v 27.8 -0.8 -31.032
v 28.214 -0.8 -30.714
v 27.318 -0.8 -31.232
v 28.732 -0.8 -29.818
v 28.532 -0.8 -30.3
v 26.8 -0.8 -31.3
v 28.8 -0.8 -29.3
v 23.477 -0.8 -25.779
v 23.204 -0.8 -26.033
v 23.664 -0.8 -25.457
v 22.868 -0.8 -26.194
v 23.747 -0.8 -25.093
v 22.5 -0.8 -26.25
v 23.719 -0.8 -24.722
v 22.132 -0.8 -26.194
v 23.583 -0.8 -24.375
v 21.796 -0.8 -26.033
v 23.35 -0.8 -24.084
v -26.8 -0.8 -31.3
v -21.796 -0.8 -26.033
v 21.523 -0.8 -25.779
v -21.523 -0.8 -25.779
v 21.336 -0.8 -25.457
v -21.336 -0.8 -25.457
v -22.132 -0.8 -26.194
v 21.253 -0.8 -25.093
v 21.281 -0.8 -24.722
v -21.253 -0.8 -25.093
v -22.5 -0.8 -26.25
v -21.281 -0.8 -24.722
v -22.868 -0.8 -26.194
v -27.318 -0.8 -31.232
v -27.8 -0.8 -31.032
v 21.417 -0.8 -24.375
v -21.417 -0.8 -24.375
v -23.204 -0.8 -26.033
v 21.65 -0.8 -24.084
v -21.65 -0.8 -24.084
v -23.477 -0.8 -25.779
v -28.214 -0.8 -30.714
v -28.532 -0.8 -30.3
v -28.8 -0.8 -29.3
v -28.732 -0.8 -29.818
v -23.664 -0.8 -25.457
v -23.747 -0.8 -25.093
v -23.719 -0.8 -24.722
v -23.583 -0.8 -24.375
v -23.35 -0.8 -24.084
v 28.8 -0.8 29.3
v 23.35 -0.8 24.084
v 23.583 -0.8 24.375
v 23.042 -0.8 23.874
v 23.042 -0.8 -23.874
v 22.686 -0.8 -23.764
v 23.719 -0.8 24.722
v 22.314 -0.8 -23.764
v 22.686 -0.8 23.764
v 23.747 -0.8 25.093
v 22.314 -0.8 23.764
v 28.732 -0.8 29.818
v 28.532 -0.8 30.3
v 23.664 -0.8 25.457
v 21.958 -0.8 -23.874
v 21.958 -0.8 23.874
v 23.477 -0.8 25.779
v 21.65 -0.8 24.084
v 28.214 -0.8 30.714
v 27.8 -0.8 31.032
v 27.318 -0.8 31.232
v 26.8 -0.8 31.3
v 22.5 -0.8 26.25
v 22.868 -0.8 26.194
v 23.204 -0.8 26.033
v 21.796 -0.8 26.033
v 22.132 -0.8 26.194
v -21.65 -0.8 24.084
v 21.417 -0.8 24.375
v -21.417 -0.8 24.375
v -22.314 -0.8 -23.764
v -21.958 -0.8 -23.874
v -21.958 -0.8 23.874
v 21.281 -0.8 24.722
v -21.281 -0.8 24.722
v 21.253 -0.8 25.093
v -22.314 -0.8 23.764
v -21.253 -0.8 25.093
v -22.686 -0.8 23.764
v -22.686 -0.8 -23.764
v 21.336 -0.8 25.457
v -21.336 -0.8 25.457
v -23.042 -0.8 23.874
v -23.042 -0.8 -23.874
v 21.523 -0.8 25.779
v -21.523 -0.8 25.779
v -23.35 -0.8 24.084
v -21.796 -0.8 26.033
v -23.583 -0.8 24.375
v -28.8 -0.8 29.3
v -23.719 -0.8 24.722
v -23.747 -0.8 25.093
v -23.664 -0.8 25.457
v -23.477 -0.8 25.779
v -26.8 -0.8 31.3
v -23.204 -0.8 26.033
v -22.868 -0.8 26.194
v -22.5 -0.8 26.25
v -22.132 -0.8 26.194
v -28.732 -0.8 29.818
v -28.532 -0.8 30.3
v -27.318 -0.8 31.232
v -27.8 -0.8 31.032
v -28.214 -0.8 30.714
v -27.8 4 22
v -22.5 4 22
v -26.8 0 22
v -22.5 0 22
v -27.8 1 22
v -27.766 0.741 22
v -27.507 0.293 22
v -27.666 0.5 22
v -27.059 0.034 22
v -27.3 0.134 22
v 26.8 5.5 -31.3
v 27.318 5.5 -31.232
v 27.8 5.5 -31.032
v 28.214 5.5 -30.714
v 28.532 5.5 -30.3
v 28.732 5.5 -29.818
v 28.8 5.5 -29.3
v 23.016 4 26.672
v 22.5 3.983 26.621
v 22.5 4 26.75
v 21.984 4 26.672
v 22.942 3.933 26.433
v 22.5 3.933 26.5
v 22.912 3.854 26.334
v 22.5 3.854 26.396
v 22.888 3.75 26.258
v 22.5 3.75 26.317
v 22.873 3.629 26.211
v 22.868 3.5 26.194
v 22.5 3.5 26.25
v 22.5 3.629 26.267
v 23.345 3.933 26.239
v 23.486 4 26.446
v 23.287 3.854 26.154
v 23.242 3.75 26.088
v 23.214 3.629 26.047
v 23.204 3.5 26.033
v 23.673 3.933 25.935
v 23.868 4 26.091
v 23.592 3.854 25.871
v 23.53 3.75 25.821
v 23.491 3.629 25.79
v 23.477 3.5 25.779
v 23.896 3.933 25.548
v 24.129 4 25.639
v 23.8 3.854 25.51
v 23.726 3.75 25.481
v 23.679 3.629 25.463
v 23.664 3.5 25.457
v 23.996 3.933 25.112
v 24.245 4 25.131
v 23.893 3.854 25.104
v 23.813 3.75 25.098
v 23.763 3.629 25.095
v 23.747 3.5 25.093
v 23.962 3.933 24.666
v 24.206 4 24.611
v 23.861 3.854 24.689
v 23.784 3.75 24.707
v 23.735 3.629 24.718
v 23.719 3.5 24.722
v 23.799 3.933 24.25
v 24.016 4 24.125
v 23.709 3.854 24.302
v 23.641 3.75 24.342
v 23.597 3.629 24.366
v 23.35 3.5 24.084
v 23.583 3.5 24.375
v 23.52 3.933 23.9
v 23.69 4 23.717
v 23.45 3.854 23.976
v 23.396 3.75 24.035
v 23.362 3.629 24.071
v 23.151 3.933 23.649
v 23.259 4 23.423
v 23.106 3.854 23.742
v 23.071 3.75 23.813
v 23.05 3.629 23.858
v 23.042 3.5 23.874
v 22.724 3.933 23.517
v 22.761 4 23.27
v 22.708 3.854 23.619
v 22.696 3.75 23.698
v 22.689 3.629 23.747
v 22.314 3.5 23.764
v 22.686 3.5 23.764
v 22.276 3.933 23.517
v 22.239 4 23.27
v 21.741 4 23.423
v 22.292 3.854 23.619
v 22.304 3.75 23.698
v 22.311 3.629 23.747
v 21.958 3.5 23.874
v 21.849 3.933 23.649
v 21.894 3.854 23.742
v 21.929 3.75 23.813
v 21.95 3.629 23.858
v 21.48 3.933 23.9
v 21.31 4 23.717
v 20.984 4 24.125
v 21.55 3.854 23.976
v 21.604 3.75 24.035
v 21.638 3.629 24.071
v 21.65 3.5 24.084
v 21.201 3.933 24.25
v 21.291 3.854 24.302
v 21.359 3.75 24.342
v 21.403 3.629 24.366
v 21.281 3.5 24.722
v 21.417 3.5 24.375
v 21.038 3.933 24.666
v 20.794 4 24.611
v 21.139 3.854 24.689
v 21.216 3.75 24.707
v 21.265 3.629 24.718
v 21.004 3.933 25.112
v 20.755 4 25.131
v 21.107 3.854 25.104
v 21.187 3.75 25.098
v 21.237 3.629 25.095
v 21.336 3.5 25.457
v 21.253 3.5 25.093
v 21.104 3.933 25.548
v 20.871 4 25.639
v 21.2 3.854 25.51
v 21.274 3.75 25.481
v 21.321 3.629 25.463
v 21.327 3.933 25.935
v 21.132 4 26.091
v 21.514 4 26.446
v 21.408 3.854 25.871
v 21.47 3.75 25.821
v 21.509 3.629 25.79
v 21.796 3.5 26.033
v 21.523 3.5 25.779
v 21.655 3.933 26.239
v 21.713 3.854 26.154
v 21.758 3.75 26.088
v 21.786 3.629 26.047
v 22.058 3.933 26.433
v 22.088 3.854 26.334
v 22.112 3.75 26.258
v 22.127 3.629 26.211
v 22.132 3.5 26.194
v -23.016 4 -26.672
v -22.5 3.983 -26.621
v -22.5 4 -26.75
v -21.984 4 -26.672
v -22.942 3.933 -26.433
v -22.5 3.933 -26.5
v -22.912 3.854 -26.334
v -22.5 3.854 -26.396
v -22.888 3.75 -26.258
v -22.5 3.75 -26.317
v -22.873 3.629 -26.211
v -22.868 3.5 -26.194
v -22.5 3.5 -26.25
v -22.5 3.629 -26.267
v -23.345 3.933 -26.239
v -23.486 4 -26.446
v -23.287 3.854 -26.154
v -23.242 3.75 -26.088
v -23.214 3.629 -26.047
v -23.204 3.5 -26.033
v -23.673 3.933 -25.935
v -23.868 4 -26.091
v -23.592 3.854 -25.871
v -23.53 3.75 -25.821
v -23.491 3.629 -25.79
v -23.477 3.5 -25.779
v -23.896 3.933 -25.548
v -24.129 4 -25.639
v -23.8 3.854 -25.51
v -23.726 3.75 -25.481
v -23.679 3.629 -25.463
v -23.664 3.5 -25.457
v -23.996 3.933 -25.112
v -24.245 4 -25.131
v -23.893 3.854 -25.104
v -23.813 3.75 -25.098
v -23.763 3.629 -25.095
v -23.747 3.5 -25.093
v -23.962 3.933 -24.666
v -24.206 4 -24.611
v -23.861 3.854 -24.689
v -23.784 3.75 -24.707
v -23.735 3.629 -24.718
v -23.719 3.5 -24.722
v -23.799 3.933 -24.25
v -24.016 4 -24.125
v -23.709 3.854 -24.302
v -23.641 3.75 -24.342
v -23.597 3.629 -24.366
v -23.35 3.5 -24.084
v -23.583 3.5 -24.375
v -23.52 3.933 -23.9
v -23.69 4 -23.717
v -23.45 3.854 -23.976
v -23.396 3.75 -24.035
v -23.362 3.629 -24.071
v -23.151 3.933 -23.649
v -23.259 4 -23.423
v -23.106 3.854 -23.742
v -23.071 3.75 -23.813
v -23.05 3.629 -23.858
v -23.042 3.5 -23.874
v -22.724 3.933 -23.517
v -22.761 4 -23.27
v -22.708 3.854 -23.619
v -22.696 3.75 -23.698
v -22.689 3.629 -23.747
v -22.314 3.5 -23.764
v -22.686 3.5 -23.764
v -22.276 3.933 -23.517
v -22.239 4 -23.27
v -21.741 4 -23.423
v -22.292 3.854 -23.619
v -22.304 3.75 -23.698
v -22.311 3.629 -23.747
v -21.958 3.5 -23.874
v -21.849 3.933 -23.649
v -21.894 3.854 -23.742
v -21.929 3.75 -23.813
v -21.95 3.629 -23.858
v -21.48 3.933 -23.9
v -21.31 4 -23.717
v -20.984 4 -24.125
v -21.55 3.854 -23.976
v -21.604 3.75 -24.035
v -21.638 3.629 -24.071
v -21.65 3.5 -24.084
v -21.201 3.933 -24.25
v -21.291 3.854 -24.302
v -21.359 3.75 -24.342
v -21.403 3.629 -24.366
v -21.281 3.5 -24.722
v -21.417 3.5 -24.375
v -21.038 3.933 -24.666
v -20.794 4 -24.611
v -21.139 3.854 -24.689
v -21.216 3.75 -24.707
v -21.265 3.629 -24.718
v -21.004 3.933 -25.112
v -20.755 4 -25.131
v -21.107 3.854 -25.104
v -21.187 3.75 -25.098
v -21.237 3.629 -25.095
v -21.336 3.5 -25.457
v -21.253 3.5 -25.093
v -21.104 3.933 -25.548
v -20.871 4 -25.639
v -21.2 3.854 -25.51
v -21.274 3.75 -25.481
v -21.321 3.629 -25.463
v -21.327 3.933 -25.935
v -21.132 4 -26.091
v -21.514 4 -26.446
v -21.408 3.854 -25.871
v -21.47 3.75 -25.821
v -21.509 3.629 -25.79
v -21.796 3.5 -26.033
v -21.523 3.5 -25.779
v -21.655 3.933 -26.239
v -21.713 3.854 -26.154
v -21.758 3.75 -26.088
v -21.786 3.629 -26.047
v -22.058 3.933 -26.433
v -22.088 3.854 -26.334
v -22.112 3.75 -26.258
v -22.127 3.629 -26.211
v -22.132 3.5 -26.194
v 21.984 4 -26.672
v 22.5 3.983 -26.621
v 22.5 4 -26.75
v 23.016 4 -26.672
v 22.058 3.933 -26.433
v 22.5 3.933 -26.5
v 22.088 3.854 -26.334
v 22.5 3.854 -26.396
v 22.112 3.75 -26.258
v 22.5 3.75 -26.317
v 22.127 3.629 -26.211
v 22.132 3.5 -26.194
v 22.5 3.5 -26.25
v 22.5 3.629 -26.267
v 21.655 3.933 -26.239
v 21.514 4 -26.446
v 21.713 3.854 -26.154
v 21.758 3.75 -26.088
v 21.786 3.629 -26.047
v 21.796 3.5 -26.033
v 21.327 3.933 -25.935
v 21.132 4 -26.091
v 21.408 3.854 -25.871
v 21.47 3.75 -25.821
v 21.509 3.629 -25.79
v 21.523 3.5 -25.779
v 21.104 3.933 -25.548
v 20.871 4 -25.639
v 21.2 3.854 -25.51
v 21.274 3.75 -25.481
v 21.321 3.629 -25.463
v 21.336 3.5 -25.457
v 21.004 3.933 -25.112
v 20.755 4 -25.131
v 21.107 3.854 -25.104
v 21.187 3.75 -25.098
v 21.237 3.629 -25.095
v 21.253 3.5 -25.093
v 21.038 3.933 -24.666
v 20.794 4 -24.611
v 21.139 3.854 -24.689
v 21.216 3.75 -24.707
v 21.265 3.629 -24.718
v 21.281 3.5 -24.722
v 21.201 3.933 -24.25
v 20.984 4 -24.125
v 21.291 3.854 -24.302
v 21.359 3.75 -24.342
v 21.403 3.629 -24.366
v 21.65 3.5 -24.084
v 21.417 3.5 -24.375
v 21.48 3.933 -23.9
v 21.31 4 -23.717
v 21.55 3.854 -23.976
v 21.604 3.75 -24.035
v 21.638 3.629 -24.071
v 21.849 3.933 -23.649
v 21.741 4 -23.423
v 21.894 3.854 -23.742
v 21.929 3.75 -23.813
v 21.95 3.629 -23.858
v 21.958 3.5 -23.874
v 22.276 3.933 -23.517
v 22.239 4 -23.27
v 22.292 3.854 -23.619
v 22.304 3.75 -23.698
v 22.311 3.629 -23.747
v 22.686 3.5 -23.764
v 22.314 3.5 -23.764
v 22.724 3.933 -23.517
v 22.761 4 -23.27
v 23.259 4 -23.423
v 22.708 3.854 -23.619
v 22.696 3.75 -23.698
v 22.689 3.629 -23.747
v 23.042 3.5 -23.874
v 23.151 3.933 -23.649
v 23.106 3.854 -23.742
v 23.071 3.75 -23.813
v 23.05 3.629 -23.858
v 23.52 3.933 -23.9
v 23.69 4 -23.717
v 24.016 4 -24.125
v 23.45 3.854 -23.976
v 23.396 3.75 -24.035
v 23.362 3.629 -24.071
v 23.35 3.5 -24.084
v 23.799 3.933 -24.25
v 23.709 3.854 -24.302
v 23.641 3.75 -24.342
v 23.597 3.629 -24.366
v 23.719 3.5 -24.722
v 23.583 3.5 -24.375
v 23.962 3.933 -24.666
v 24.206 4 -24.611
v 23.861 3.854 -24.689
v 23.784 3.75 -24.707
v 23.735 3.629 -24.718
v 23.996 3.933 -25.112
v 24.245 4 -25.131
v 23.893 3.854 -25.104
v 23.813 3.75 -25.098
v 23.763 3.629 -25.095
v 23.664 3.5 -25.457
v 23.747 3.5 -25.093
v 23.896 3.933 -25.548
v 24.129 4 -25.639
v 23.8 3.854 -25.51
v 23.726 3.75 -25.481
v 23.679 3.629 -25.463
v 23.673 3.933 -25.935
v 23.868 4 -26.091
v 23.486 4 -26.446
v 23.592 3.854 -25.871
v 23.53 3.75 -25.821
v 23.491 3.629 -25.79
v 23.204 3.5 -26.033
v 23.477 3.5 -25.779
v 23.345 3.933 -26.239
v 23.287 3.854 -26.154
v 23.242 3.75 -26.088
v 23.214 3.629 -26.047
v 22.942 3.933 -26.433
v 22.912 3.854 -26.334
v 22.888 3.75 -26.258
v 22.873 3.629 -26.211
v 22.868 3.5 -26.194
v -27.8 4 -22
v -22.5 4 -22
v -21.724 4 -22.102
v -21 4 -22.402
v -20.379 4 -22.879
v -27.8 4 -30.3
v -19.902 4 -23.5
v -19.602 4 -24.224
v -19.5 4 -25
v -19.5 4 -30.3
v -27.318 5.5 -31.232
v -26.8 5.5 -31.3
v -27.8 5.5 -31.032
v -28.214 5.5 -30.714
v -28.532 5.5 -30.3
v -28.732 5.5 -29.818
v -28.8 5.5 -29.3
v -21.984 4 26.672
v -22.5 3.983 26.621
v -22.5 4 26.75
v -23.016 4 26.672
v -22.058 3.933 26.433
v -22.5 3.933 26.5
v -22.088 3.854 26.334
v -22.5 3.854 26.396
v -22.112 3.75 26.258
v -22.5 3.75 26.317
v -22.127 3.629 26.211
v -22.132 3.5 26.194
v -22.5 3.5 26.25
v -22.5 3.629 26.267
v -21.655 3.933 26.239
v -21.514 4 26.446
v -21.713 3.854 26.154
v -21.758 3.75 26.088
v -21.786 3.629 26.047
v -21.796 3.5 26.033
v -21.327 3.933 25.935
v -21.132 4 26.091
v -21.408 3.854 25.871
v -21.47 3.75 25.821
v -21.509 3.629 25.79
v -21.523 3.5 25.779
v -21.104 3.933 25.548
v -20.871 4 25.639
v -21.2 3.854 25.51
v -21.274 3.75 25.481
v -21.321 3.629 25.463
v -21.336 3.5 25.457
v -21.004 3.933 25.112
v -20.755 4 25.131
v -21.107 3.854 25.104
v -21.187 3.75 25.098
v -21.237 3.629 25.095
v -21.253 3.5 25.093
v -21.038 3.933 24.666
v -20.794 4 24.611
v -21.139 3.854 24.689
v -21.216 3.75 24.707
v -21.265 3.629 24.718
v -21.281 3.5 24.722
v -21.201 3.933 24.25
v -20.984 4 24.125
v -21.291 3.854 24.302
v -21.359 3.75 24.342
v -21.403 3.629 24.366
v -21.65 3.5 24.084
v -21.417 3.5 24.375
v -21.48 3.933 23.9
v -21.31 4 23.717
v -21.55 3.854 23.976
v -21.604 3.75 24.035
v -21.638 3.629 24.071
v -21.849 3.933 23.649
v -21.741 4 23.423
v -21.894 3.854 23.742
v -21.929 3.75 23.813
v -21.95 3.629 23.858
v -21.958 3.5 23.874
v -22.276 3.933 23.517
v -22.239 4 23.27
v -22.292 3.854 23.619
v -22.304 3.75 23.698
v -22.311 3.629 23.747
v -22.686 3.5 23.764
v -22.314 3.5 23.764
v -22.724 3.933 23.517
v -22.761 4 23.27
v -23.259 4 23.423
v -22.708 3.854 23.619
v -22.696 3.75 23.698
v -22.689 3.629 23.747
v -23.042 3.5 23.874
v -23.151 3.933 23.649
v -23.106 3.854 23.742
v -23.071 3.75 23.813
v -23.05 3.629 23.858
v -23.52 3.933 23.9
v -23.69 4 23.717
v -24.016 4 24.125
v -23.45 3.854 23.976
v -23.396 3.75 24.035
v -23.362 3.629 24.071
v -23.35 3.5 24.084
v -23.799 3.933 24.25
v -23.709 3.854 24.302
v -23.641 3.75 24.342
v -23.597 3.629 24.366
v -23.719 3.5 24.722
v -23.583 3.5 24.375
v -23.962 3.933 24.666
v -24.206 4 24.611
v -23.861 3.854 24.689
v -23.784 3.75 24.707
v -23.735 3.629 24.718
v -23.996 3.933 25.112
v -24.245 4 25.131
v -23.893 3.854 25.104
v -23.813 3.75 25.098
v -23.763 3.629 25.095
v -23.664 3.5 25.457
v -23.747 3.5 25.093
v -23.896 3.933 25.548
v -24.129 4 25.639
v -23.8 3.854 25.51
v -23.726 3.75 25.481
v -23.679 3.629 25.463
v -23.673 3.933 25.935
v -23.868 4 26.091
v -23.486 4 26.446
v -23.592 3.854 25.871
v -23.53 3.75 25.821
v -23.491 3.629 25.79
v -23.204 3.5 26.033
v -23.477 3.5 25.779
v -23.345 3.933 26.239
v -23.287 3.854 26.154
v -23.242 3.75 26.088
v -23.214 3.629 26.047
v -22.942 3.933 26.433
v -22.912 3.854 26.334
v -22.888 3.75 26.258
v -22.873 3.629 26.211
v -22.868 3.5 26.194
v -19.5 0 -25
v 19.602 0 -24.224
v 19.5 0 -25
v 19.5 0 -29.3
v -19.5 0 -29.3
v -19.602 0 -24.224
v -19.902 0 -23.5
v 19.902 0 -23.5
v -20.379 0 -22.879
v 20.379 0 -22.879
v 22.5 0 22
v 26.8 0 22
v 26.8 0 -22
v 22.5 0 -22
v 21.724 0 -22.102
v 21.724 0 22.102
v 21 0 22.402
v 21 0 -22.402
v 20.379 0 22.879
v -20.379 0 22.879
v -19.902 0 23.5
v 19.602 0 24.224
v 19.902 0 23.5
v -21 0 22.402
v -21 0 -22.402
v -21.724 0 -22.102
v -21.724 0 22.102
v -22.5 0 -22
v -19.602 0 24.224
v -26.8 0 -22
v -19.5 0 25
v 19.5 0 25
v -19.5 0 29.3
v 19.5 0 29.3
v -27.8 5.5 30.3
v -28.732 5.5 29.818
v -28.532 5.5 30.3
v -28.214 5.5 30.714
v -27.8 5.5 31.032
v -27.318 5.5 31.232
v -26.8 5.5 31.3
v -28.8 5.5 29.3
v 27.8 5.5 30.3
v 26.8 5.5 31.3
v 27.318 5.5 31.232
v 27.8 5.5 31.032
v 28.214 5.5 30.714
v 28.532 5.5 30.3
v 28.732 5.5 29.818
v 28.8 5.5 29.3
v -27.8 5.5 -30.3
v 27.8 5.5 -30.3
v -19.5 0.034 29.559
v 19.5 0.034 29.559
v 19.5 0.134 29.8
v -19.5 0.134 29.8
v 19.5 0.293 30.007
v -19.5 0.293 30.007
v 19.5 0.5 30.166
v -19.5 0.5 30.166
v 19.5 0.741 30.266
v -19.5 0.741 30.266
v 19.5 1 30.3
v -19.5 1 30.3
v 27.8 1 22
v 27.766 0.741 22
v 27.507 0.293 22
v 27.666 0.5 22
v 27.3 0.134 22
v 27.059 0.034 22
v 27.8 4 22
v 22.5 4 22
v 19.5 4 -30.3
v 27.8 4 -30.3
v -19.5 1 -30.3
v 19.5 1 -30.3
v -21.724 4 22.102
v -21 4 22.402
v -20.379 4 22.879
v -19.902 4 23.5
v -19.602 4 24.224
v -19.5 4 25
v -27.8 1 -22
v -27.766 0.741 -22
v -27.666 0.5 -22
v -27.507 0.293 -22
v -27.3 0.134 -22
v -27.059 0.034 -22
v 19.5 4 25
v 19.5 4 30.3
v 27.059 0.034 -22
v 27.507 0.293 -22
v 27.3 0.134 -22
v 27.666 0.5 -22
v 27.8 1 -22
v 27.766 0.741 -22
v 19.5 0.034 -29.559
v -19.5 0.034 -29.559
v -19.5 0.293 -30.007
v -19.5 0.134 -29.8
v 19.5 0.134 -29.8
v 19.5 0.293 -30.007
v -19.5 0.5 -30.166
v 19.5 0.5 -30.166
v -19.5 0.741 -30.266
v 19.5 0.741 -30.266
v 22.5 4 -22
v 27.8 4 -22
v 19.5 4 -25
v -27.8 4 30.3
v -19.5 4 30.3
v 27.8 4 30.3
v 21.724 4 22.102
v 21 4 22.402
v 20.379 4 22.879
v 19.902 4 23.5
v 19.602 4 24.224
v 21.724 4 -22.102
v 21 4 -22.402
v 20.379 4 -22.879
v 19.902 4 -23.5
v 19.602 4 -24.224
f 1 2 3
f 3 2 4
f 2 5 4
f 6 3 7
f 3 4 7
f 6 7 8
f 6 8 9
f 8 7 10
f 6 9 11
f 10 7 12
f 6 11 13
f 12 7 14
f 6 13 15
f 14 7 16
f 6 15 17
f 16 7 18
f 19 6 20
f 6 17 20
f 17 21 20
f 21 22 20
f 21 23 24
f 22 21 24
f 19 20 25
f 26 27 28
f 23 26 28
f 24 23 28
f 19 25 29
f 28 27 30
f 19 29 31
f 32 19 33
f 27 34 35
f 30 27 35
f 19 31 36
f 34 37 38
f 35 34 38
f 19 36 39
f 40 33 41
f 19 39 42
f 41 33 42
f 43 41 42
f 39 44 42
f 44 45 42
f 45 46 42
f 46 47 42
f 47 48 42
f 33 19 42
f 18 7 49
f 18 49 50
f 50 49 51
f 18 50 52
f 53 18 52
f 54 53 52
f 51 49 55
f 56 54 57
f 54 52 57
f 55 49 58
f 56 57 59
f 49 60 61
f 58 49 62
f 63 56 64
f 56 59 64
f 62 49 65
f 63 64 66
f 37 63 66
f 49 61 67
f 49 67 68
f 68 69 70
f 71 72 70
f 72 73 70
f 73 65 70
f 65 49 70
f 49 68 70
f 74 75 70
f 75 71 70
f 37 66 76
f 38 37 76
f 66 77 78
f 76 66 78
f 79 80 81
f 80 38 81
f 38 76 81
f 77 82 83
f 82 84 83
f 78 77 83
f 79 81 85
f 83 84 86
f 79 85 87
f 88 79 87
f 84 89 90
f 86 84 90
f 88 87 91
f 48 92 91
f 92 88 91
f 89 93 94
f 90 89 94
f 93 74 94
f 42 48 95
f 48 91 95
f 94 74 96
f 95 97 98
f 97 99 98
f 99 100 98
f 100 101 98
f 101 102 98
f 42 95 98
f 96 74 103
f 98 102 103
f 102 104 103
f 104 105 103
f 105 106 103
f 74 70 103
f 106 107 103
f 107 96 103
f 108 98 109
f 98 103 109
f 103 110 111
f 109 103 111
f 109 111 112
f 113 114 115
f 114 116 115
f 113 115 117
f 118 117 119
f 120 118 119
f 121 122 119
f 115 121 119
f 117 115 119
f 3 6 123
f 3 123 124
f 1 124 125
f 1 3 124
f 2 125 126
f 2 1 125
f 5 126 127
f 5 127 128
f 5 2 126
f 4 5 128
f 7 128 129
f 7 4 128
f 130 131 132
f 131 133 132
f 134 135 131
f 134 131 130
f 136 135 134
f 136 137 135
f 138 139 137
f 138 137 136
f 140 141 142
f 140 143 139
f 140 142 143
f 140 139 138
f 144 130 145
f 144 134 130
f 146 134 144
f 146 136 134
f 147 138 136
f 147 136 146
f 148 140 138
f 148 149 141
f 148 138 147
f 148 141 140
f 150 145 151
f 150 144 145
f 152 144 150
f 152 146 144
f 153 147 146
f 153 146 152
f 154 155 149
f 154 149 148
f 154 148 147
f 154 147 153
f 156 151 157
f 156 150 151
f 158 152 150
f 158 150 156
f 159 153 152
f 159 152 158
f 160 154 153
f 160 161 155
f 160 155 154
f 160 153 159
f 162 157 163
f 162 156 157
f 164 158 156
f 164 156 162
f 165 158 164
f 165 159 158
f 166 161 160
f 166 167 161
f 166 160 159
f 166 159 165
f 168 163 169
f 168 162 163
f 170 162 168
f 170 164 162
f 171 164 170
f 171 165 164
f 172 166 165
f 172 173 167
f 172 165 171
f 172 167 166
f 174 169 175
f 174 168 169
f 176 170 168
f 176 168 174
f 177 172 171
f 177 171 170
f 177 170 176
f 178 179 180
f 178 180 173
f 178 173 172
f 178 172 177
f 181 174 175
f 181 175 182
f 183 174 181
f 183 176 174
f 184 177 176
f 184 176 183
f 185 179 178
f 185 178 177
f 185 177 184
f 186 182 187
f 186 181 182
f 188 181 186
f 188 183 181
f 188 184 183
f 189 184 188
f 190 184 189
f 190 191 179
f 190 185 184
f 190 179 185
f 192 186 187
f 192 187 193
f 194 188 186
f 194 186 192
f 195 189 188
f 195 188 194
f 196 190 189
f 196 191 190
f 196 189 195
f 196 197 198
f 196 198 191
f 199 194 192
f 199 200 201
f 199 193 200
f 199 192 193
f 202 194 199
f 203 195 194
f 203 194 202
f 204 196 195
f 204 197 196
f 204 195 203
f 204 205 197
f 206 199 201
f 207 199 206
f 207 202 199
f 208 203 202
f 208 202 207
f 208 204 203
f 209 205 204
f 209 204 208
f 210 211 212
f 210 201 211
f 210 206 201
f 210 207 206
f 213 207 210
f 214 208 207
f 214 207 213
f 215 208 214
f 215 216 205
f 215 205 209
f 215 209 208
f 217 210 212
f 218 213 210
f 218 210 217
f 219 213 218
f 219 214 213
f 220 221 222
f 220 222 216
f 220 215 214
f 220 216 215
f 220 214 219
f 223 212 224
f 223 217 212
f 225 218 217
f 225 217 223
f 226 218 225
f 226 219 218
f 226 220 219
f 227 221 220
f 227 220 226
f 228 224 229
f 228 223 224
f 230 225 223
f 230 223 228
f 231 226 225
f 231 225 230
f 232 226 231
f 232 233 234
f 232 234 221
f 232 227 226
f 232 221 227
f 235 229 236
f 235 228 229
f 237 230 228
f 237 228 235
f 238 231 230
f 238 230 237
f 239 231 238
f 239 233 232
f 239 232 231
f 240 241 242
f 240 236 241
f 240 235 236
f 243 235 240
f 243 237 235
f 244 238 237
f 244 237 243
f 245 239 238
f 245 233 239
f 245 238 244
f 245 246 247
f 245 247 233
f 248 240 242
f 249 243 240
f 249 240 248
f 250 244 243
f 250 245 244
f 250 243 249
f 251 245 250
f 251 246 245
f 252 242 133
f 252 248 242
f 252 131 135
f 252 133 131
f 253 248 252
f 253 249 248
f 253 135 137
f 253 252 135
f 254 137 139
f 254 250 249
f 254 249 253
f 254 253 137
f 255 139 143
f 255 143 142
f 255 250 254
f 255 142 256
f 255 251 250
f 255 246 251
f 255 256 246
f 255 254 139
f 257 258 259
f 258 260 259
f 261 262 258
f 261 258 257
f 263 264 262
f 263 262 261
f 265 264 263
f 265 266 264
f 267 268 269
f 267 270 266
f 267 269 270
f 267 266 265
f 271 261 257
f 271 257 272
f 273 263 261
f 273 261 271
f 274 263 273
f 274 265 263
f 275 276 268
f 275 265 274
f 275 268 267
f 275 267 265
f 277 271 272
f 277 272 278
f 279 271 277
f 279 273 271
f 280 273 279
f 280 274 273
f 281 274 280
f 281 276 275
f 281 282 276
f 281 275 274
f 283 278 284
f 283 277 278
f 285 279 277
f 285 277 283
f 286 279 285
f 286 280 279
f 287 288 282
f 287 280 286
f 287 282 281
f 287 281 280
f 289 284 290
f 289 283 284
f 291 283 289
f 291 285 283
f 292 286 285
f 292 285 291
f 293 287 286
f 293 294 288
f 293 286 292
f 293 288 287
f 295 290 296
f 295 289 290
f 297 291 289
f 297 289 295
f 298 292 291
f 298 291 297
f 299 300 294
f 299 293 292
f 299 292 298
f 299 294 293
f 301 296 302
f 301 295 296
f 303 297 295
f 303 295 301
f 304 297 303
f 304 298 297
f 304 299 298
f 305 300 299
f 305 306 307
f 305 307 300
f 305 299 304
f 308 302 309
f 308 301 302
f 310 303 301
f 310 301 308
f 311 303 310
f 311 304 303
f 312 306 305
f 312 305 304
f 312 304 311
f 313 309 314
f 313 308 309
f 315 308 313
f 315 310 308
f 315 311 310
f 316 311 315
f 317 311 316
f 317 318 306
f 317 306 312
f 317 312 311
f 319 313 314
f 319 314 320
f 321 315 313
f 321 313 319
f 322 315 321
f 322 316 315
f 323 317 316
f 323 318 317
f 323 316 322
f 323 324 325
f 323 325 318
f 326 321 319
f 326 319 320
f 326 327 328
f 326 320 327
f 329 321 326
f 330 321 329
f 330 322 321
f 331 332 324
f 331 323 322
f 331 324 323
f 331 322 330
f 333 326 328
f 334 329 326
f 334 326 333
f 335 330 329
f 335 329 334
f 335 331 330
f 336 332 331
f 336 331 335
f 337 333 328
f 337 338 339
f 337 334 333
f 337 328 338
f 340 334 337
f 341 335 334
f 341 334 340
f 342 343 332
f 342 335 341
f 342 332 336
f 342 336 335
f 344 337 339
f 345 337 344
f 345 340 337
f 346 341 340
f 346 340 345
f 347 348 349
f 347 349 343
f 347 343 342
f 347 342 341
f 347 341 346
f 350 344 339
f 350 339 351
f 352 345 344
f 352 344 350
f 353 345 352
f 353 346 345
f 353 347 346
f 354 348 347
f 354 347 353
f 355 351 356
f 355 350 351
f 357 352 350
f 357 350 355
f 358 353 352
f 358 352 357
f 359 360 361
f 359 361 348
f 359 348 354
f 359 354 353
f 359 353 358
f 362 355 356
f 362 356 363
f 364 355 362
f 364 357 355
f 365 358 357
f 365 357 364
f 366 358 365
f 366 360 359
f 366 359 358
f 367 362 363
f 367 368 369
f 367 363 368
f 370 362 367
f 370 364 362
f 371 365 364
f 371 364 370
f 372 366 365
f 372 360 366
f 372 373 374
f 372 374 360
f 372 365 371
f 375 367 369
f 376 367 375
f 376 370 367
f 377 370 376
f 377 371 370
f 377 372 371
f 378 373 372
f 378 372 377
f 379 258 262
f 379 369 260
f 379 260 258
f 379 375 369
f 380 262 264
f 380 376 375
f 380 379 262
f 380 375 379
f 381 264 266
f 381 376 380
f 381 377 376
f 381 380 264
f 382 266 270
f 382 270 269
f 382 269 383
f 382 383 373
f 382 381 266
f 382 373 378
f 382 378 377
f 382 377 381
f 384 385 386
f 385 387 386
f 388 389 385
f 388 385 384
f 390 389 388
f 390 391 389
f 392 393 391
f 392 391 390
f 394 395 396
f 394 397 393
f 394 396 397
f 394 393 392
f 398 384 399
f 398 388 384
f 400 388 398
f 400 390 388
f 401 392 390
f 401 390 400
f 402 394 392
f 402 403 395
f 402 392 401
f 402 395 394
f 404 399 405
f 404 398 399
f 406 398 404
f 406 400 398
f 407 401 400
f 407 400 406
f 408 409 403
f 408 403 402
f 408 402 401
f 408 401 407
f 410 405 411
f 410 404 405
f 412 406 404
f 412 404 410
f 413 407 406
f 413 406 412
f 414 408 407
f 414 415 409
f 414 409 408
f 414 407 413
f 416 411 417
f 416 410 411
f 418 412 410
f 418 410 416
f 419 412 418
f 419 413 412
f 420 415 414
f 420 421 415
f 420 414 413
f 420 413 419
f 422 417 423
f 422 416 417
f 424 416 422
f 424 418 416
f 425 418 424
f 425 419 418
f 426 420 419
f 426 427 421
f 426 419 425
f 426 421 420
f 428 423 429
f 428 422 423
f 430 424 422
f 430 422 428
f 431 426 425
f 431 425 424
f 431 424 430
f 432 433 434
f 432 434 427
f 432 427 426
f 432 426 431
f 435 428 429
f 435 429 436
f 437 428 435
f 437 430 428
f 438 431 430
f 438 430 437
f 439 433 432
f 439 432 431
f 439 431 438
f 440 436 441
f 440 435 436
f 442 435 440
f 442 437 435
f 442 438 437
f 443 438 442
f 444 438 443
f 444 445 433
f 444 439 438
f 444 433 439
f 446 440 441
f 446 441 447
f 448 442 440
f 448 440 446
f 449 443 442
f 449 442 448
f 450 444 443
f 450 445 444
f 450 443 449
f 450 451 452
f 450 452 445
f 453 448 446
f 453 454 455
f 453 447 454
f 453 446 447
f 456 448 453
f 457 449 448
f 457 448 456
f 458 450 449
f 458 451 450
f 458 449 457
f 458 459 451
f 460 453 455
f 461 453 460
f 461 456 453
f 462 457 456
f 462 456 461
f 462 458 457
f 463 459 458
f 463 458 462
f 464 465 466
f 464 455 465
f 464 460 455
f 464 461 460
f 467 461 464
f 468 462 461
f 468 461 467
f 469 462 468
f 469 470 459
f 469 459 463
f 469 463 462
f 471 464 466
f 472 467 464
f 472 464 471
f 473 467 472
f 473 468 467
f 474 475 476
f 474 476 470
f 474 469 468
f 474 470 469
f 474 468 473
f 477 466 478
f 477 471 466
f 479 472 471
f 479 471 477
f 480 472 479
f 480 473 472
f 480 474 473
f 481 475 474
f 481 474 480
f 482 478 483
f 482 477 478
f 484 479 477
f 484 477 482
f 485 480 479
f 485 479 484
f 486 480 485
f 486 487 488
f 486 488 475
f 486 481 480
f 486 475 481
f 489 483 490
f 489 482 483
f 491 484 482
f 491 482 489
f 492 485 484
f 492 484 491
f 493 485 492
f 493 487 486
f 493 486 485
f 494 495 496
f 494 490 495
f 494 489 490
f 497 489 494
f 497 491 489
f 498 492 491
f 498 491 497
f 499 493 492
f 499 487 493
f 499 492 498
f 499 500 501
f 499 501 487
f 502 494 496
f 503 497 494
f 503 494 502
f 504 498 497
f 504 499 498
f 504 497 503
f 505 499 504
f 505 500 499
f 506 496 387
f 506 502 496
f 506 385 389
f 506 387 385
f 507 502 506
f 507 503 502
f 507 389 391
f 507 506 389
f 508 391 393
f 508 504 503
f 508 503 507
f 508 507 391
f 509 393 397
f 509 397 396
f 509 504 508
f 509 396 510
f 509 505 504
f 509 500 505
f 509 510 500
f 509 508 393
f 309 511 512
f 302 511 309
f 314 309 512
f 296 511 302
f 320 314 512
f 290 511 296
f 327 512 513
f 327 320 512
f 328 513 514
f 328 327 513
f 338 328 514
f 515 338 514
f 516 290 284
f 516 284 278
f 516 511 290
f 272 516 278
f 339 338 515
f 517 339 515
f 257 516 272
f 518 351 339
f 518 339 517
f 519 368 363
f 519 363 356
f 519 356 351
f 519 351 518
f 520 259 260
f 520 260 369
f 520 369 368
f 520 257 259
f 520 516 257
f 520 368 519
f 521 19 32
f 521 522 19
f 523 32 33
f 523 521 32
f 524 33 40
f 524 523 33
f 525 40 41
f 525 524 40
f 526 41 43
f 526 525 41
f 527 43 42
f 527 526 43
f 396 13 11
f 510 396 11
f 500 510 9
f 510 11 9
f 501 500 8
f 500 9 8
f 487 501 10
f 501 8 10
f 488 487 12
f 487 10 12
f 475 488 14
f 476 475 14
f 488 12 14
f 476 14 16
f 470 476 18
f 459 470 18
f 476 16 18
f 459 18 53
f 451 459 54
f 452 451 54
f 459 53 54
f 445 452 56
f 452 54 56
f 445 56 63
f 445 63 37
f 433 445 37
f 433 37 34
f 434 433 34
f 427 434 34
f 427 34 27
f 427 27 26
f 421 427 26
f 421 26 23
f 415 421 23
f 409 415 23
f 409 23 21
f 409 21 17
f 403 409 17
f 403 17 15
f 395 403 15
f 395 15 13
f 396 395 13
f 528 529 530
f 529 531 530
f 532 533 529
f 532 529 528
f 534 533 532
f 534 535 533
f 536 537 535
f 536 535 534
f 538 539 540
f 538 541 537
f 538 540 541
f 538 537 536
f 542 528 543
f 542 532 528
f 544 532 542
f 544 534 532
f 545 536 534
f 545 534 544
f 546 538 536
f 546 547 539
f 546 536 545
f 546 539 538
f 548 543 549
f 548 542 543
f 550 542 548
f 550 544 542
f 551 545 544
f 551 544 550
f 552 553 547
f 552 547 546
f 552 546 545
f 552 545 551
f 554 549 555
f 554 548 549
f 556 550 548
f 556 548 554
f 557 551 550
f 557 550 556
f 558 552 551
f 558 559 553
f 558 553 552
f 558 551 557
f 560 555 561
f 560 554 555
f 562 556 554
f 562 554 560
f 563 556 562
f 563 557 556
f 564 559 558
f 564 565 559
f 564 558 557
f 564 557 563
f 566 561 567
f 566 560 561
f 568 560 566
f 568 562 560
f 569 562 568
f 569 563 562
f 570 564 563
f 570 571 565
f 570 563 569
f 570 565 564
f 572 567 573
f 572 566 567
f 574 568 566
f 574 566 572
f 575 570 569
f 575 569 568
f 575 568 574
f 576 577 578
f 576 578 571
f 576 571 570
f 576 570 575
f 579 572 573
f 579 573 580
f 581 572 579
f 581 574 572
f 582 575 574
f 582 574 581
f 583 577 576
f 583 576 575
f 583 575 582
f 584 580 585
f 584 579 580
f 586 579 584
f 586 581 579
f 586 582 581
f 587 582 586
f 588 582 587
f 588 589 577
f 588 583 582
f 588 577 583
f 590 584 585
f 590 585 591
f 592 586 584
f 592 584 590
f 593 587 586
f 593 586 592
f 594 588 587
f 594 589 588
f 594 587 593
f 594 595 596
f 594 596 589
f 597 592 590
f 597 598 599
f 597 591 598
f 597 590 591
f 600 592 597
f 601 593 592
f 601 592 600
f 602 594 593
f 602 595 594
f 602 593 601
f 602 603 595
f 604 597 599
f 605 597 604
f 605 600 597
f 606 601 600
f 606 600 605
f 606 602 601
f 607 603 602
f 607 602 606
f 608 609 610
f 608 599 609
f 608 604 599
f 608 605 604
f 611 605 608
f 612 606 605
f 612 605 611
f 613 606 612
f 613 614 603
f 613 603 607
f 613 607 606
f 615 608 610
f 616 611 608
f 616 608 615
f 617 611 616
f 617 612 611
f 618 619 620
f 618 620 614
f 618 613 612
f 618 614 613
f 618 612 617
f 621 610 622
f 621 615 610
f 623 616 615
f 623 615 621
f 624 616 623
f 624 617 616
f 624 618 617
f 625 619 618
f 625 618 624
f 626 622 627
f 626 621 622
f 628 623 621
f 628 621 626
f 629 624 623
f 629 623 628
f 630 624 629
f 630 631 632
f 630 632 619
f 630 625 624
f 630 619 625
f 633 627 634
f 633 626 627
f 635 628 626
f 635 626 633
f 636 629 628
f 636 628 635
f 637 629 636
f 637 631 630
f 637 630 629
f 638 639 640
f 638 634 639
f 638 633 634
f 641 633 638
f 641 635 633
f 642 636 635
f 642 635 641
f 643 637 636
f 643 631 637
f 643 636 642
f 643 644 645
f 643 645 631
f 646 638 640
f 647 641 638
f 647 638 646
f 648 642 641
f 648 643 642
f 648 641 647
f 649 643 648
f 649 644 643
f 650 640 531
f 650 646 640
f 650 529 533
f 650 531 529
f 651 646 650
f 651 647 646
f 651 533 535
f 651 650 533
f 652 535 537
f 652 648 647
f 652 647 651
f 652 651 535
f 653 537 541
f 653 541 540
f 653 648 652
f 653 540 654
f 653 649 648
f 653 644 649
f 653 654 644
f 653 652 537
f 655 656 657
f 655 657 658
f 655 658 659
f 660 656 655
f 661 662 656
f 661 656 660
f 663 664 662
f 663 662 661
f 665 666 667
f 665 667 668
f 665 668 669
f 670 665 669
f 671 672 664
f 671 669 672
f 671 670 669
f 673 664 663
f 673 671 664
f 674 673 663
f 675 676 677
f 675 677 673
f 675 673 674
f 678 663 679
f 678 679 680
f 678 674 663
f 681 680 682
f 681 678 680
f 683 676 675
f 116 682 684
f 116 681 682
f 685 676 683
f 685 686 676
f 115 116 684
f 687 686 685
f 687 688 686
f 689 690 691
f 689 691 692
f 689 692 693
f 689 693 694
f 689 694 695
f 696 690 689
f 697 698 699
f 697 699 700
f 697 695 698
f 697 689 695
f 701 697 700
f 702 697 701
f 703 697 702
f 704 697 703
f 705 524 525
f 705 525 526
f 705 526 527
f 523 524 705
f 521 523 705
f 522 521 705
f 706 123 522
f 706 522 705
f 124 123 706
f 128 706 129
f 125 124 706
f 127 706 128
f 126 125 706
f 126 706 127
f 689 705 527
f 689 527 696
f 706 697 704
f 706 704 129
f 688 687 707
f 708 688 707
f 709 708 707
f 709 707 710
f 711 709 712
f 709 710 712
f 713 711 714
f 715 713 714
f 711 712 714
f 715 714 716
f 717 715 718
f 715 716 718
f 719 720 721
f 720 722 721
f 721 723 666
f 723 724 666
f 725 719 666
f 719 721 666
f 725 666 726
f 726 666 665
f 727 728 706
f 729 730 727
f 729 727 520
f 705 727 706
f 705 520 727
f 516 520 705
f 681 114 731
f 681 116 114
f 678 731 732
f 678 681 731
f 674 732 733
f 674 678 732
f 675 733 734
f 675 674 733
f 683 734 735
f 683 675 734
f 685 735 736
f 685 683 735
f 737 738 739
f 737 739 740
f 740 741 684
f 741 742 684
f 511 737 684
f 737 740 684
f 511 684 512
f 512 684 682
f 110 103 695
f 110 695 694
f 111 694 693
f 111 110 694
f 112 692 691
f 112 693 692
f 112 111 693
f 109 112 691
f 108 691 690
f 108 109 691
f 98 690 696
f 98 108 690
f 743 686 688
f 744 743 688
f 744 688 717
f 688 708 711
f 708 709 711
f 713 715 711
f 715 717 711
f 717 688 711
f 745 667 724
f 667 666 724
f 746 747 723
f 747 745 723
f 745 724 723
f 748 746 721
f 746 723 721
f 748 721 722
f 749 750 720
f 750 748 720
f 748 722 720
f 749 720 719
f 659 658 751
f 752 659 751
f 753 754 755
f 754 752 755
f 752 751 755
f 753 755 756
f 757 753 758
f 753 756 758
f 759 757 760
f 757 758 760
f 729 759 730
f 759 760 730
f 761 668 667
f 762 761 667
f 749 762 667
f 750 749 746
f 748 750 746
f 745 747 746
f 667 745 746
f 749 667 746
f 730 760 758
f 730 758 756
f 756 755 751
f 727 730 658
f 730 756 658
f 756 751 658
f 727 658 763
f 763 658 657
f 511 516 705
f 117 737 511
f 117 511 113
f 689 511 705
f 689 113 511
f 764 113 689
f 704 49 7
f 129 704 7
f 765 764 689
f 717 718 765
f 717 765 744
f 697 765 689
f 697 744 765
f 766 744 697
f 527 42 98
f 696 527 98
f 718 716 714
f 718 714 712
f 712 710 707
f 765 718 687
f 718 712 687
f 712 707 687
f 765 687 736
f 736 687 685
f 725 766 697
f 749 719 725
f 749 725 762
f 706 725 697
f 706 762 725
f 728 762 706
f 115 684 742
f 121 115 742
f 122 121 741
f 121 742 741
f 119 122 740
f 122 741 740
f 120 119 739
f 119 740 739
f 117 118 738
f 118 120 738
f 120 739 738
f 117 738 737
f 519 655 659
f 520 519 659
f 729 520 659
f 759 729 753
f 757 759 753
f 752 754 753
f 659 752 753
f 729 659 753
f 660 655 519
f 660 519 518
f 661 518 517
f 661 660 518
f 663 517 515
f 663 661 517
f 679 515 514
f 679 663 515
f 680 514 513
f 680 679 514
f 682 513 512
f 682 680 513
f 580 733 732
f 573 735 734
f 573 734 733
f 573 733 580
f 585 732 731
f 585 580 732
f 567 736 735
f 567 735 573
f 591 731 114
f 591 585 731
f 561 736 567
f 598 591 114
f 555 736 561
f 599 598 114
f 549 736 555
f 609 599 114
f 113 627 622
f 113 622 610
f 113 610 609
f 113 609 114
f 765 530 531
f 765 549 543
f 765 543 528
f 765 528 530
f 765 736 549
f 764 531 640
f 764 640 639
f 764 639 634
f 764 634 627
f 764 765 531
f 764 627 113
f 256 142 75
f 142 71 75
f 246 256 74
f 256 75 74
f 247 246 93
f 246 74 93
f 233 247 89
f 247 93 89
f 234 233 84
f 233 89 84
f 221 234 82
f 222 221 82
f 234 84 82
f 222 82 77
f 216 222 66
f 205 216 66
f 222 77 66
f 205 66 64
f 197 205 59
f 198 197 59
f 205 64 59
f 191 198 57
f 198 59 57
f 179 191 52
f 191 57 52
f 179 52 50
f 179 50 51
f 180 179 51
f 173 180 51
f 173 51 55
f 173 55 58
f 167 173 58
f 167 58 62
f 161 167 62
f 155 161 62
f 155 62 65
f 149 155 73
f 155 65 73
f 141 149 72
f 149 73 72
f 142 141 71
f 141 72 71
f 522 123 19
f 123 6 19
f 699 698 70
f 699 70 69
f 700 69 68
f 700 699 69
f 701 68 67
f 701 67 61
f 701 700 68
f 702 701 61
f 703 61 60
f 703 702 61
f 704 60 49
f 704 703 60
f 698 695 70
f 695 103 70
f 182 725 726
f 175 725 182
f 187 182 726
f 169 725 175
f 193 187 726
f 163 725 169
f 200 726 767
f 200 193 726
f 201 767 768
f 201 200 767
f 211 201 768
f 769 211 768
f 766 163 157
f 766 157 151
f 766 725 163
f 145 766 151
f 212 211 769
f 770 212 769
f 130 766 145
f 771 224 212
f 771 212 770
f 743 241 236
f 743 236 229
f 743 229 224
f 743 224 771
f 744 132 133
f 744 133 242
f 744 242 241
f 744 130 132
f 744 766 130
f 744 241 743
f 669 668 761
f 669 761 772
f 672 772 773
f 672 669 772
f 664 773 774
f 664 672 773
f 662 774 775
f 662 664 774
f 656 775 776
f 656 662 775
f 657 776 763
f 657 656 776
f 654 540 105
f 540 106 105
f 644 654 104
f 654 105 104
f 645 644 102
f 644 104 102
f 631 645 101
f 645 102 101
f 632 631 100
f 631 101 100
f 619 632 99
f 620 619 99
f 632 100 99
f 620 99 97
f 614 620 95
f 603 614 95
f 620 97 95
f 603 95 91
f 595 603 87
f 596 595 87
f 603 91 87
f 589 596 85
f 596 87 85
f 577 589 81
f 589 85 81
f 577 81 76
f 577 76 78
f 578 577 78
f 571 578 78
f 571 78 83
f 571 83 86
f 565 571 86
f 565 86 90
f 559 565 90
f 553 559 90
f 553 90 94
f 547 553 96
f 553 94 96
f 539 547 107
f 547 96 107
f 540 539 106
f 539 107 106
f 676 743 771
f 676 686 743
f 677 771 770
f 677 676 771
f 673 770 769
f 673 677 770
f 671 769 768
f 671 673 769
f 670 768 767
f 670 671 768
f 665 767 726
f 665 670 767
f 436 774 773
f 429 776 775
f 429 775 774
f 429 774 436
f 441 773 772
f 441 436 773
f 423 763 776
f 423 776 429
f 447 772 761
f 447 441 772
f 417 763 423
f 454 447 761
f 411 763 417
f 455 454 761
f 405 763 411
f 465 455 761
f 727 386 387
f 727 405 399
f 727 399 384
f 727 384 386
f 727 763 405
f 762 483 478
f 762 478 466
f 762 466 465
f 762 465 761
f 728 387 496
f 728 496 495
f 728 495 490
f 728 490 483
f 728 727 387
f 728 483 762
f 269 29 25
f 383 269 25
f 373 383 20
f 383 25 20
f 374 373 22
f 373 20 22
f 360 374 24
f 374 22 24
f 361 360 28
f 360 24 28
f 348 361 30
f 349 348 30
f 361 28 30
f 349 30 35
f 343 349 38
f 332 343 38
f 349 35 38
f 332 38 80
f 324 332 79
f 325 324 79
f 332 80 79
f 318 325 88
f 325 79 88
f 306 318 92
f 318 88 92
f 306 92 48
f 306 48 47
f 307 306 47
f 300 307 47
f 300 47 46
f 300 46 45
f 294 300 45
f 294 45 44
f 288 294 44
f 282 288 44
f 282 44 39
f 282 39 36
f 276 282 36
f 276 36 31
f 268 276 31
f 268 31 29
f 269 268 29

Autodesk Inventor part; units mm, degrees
ref_plane "YZ Plane" through (0, 0, 0) normal (1, 0, 0) x (0, 1, 0)
ref_plane "XZ Plane" through (0, 0, 0) normal (0, 1, 0) x (-1, 0, 0)
ref_plane "XY Plane" through (0, 0, 0) normal (0, 0, 1) x (1, 0, 0)
sketch "スケッチ1" plane through (0, 0, 0) normal (0, 1, 0) x (-1, 0, 0)
  line L0 (27.5, 30) -> (-27.5, 30) construction
  line L1 (-27.5, 30) -> (-27.5, -30) construction
  line L2 (-27.5, -30) -> (27.5, -30) construction
  line L3 (27.5, -30) -> (27.5, 30) construction
  line L4 (27.5, 30) -> (-27.5, -30) construction
  line L5 (-27.5, 30) -> (27.5, -30) construction
  line L6 (27.8, 30.3) -> (-27.8, 30.3)
  line L7 (-27.8, 30.3) -> (-27.8, -30.3)
  line L8 (-27.8, -30.3) -> (27.8, -30.3)
  line L9 (27.8, -30.3) -> (27.8, 30.3)
  line L10 (28.8, 31.3) -> (-28.8, 31.3)
  line L11 (-28.8, 31.3) -> (-28.8, -31.3)
  line L12 (-28.8, -31.3) -> (28.8, -31.3)
  line L13 (28.8, -31.3) -> (28.8, 31.3)
  line L14 (-22.5, 25) -> (22.5, 25) construction
  line L15 (22.5, 25) -> (22.5, -25) construction
  line L16 (22.5, -25) -> (-22.5, -25) construction
  line L17 (-22.5, -25) -> (-22.5, 25) construction
  line L18 (19.5, 30.3) -> (19.5, 25)
  arc A0 (19.5, 25) -> (22.5, 22) centre (22.5, 25) ccw
  line L19 (22.5, 22) -> (27.8, 22)
  line L20 (0, 0) -> (0, 30.3)
  line L21 (0, 30.3) -> (0, 31.3)
  line L22 (0, 0) -> (27.8, 0)
  line L23 (27.8, 0) -> (28.8, 0)
  dimension "d0" = 55
  dimension "d1" = 60
  dimension "d2" = 0.3
  dimension "d3" = 1
  dimension "d4" = 5
  dimension "d5" = 3
extrude "押し出し1" add sketch "スケッチ1" against normal blind 0.8 contours L9 L19 A0 L18 L6 | L6 L21 L10 L13 L23 L9 | L18 A0 L19 L9 L22 L20 L6
extrude "押し出し2" add sketch "スケッチ1" along normal blind 4 contours L9 L19 A0 L18 L6
extrude "押し出し3" add sketch "スケッチ1" along normal blind 5.5 contours L6 L21 L10 L13 L23 L9
hole "穴1" at (22.5, 0, 25) at (-22.5, 0, 25) at (-22.5, 0, -25) at (22.5, 0, -25) direction (0, -1, 0) diameter 2.5 end through all both
fillet "フィレット1" radius 0.5 1 edges at (-22.5, 4, 23.75)
mirror "ミラー1" about plane through (-28.8, 0, 0) normal (0, 0, -1) of "フィレット1", "穴1", "押し出し3", "押し出し2", "押し出し1"
mirror "ミラー2" about plane through (0, 0, 30.3) normal (1, 0, 0) of "フィレット1", "穴1", "押し出し3", "押し出し2", "押し出し1", "ミラー1"
fillet "フィレット2" radius 1 4 edges at (-27.8, 0, 0) (0, 0, 30.3) (27.8, 0, 0) (0, 0, -30.3)
fillet "フィレット3" radius 2 4 edges at (28.8, 2.35, 31.3) (-28.8, 2.35, 31.3) (-28.8, 2.35, -31.3) (28.8, 2.35, -31.3)
properties part number "MD_hf_base_sa_1" material "ABS プラスチック"
